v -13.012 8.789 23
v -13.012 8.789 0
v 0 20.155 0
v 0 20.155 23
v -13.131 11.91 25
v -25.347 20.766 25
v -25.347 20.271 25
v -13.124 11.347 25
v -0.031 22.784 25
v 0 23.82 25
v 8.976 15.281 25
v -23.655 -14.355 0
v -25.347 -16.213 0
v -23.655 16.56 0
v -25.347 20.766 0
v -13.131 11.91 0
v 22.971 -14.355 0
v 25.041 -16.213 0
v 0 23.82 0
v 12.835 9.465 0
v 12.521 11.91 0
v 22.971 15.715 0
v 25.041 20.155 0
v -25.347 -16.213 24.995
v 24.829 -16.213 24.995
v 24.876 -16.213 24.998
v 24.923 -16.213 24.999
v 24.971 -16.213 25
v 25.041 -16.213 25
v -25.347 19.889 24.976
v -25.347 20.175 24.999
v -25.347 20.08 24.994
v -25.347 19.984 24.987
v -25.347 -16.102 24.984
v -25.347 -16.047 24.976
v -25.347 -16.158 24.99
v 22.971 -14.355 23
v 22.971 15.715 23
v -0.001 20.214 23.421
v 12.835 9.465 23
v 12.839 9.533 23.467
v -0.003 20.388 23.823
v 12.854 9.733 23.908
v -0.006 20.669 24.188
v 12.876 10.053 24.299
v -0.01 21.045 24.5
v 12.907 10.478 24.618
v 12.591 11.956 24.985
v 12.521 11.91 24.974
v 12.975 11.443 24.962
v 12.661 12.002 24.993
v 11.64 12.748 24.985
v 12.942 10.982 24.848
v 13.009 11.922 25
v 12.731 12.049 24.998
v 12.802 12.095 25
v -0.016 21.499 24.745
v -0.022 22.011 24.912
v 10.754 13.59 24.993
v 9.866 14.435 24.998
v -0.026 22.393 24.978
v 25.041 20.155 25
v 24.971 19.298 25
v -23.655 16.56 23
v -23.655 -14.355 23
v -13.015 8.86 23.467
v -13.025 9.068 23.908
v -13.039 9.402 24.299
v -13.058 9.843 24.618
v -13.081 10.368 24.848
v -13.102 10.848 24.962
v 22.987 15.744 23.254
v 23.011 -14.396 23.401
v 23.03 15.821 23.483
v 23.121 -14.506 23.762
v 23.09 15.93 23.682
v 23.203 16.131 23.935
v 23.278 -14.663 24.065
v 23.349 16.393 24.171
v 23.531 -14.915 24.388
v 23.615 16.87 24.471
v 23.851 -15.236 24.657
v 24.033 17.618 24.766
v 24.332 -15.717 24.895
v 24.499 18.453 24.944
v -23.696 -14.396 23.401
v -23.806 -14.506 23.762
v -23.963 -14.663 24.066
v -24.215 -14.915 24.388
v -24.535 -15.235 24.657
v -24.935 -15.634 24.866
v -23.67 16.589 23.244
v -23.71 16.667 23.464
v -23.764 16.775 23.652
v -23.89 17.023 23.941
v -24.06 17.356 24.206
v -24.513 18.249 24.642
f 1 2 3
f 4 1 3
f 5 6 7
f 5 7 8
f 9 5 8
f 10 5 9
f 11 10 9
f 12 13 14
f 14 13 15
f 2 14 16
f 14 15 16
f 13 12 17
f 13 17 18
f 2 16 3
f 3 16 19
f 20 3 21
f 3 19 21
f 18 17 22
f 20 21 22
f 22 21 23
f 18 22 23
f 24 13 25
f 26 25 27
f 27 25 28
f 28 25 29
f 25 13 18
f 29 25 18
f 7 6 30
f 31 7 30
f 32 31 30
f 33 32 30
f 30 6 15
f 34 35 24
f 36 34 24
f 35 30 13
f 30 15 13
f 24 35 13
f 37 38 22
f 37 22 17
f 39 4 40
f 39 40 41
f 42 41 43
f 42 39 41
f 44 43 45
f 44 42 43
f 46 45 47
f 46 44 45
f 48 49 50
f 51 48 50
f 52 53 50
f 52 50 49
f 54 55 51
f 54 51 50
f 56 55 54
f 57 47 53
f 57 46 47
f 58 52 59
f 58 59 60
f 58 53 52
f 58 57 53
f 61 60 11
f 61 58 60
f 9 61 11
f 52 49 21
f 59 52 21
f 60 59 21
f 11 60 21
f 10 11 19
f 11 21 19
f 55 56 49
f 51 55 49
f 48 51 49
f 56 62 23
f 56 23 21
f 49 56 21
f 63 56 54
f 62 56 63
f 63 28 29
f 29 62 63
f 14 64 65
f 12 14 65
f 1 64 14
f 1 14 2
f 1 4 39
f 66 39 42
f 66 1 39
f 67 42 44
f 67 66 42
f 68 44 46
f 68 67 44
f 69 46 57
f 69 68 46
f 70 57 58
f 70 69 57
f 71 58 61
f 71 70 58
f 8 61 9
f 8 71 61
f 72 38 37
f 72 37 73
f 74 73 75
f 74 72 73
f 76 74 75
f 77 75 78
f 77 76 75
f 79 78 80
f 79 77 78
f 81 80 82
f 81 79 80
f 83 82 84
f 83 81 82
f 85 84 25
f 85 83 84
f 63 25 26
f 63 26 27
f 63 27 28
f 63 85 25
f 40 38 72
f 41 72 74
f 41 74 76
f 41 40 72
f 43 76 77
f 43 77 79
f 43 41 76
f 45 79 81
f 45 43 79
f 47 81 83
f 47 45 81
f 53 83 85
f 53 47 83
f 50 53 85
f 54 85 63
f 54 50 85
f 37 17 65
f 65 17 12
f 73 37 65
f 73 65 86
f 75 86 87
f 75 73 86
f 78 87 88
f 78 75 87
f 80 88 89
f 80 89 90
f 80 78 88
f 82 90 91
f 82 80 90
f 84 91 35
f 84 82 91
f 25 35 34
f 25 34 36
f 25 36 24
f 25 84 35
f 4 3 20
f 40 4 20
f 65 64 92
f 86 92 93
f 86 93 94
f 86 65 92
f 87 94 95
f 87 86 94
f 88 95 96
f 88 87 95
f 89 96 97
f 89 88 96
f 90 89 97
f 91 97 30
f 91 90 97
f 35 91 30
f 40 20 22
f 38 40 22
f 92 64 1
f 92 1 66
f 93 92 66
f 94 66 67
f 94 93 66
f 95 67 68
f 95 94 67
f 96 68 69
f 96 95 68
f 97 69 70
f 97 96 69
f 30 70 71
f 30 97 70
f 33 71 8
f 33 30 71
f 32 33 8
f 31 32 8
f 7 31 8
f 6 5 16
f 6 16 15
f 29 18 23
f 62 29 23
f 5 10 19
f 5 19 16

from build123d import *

# Parameters (mm, degrees)
F2_DEPTH     = 25
F3_T1_DEPTH  = 46.6258954257
F3_T6_DEPTH  = 35.914994888
F3_T11_DEPTH = 23.17796644
F3_T16_DEPTH = 27.2775423945
F3_T21_DEPTH = 26.7037330094
F3_T26_DEPTH = 21.9083744996
F3_T31_DEPTH = 35.0703225657
F3_T37_DEPTH = 51.6258954257
F3_T43_DEPTH = 40.914994888
F3_T52_DEPTH = 23.17796644
F3_T57_DEPTH = 35.914994888
F3_T66_DEPTH = 26.7037330094
F3_T71_DEPTH = 27.2775423945
F3_T79_DEPTH = 35.0703225657
F3_T84_DEPTH = 21.9083744996
F3_T92_DEPTH = 51.6258954257
F3_T98_DEPTH = 40.0703225657


# Not quite as in the source:
# - a fillet or chamfer that OpenCascade refuses, or shapes differently, is made with other operations: its cross-section is extruded or revolved along the edge and cut away or added


with BuildPart() as f2:
    # F0 (on Top) → F2 (new body)
    with BuildSketch(Plane.XY):
        Polygon((-25.346679613, 20.7659546286), (-25.346679613, 0), (-25.346679613, -16.2133686244), (25.0412952155, -16.2133686244), (25.0412952155, 0), (25.0412952155, 20.1551914215), (12.5206476077, 11.909885332), (0, 23.819770664), (-13.1314117461, 11.909885332), align=None)
        Polygon((-23.6552227288, -14.3550904468), (-23.6552227288, 16.5599044412), (-13.0123551935, 8.7889218703), (0, 20.1551914215), (12.8346113488, 9.4646606594), (22.9706726968, 15.715232119), (22.9706726968, -14.3550904468), align=None, mode=Mode.SUBTRACT)
    extrude(amount=F2_DEPTH)

    # F3: fillet of radius 2 on 7 edges, made by hand

    # F3_s2 → F3_t1 (cut)
    with BuildSketch(Plane.YZ.offset(-23.6552227288)):
        with BuildLine():
            ThreePointArc((-14.3550904468, 23), (-14.9408768844, 24.4142135624), (-16.3550904468, 25))
            Line((-16.3550904468, 25), (-14.3550904468, 25))
            Line((-14.3550904468, 25), (-14.3550904468, 23))
        make_face()
    extrude(amount=F3_T1_DEPTH, mode=Mode.SUBTRACT)


with BuildPart() as f3_tool4:
    # F3_s5 → F3_t6 (new body)
    with BuildSketch(Plane.XZ.offset(14.3550904468)):
        with BuildLine():
            ThreePointArc((-23.6552227288, 23), (-24.2410091665, 24.4142135624), (-25.6552227288, 25))
            Line((-25.6552227288, 25), (-23.6552227288, 25))
            Line((-23.6552227288, 25), (-23.6552227288, 23))
        make_face()
    extrude(amount=-F3_T6_DEPTH)

    split(bisect_by=Plane(origin=(-0.3391697192, -0.4645150547, 0), x_dir=(0, 0, 1), z_dir=(-0.5896951253, -0.8076259402, 0)), keep=Keep.TOP)


with BuildPart() as f2_1:
    add(f2.part)

    # F3_t3: cut F3_tool4
    add(f3_tool4.part, mode=Mode.SUBTRACT)


with BuildPart() as f3_tool9:
    # F3_s10 → F3_t11 (new body)
    with BuildSketch(Plane(origin=(-27.3541827104, 19.9728951224, 0), x_dir=(0, 0, 1), z_dir=(0.8076259402, -0.5896951253, 0))):
        with BuildLine():
            ThreePointArc((23, 0.5751611378), (24.4142135624, -0.0106252998), (25, -1.4248388622))
            Line((25, -1.4248388622), (25, 0.5751611378))
            Line((25, 0.5751611378), (23, 0.5751611378))
        make_face()
    extrude(amount=F3_T11_DEPTH)

    split(bisect_by=Plane.YZ.offset(-23.6552227288), keep=Keep.TOP)


with BuildPart() as f2_2:
    add(f2_1.part)

    # F3_t8: cut F3_tool9
    add(f3_tool9.part, mode=Mode.SUBTRACT)


with BuildPart() as f3_tool14:
    # F3_s15 → F3_t16 (new body)
    with BuildSketch(Plane(origin=(-6.7919181581, -5.9327286573, 0), x_dir=(0, 0, 1), z_dir=(0.7531369275, 0.6578637917, 0))):
        with BuildLine():
            ThreePointArc((23, -15.1796189401), (24.4142135624, -15.7654053777), (25, -17.1796189401))
            Line((25, -17.1796189401), (25, -15.1796189401))
            Line((25, -15.1796189401), (23, -15.1796189401))
        make_face()
    extrude(amount=F3_T16_DEPTH)

    split(bisect_by=Plane(origin=(9.9115559644, 11.8994062592, 0), x_dir=(0, 0, 1), z_dir=(-0.6400084793, -0.7683678458, 0)), keep=Keep.TOP)


with BuildPart() as f2_3:
    add(f2_2.part)

    # F3_t13: cut F3_tool14
    add(f3_tool14.part, mode=Mode.SUBTRACT)


with BuildPart() as f3_tool19:
    # F3_s20 → F3_t21 (new body)
    with BuildSketch(Plane(origin=(-13.7533951932, 11.4558275588, 0), x_dir=(0, 0, 1), z_dir=(0.7683678458, -0.6400084793, 0))):
        with BuildLine():
            ThreePointArc((23, -15.4866010137), (24.4142135624, -16.0723874513), (25, -17.4866010137))
            Line((25, -17.4866010137), (25, -15.4866010137))
            Line((25, -15.4866010137), (23, -15.4866010137))
        make_face()
    extrude(amount=F3_T21_DEPTH)

    split(bisect_by=Plane(origin=(-9.9861216728, 11.432331569, 0), x_dir=(0, 0, 1), z_dir=(0.6578637917, -0.7531369275, 0)), keep=Keep.TOP)


with BuildPart() as f2_4:
    add(f2_3.part)

    # F3_t18: cut F3_tool19
    add(f3_tool19.part, mode=Mode.SUBTRACT)


with BuildPart() as f3_tool24:
    # F3_s25 → F3_t26 (new body)
    with BuildSketch(Plane(origin=(9.271243063, 5.7172668253, 0), x_dir=(0, 0, 1), z_dir=(0.8511708587, 0.5248887209, 0))):
        with BuildLine():
            ThreePointArc((23, -1.3193006058), (24.4142135624, -1.9050870434), (25, -3.3193006058))
            Line((25, -3.3193006058), (25, -1.3193006058))
            Line((25, -1.3193006058), (23, -1.3193006058))
        make_face()
    extrude(amount=F3_T26_DEPTH)

    split(bisect_by=Plane.YZ.offset(22.9706726968), keep=Keep.BOTTOM)


with BuildPart() as f2_5:
    add(f2_4.part)

    # F3_t23: cut F3_tool24
    add(f3_tool24.part, mode=Mode.SUBTRACT)


with BuildPart() as f3_tool29:
    # F3_s30 → F3_t31 (new body)
    with BuildSketch(Plane.XZ.offset(-20.715232119)):
        with BuildLine():
            ThreePointArc((22.9706726968, 23), (23.5564591345, 24.4142135624), (24.9706726968, 25))
            Line((24.9706726968, 25), (22.9706726968, 25))
            Line((22.9706726968, 25), (22.9706726968, 23))
        make_face()
    extrude(amount=F3_T31_DEPTH)

    split(bisect_by=Plane(origin=(-0.6924860075, 1.1229502295, 0), x_dir=(0, 0, 1), z_dir=(0.5248887209, -0.8511708587, 0)), keep=Keep.TOP)


with BuildPart() as f2_6:
    add(f2_5.part)

    # F3_t28: cut F3_tool29
    add(f3_tool29.part, mode=Mode.SUBTRACT)


with BuildPart() as f3_tool35:
    # F3_s36 → F3_t37 (new body)
    with BuildSketch(Plane.YZ.offset(22.9706726968)):
        with BuildLine():
            ThreePointArc((-14.3550904468, 23), (-14.9408768844, 24.4142135624), (-16.3550904468, 25))
            Line((-16.3550904468, 25), (-14.3550904468, 25))
            Line((-14.3550904468, 25), (-14.3550904468, 23))
        make_face()
    extrude(amount=-F3_T37_DEPTH)

    split(bisect_by=Plane.YZ.offset(-25.346679613), keep=Keep.TOP)

    split(bisect_by=Plane.YZ.offset(-23.6552227288), keep=Keep.BOTTOM)

    split(bisect_by=Plane.XZ.offset(16.2133686244), keep=Keep.BOTTOM)


with BuildPart() as f3_tool41:
    # F3_s42 → F3_t43 (new body)
    with BuildSketch(Plane.XZ.offset(19.3550904468)):
        with BuildLine():
            ThreePointArc((-23.6552227288, 23), (-24.2410091665, 24.4142135624), (-25.6552227288, 25))
            Line((-25.6552227288, 25), (-23.6552227288, 25))
            Line((-23.6552227288, 25), (-23.6552227288, 23))
        make_face()
    extrude(amount=-F3_T43_DEPTH)

    split(bisect_by=Plane.YZ.offset(-25.346679613), keep=Keep.TOP)

    split(bisect_by=Plane.XZ.offset(14.3550904468), keep=Keep.TOP)

    split(bisect_by=Plane.XZ.offset(16.2133686244), keep=Keep.BOTTOM)


with BuildPart() as f3_tool35_1:
    add(f3_tool35.part)

    # F3_t47: intersect F3_tool41
    add(f3_tool41.part, mode=Mode.INTERSECT)


with BuildPart() as f2_7:
    add(f2_6.part)

    # F3_t33: cut F3_tool35
    add(f3_tool35_1.part, mode=Mode.SUBTRACT)


with BuildPart() as f3_tool50:
    # F3_s51 → F3_t52 (new body)
    with BuildSketch(Plane(origin=(-27.3541827104, 19.9728951224, 0), x_dir=(0, 0, 1), z_dir=(0.8076259402, -0.5896951253, 0))):
        with BuildLine():
            ThreePointArc((23, 0.5751611378), (24.4142135624, -0.0106252998), (25, -1.4248388622))
            Line((25, -1.4248388622), (25, 0.5751611378))
            Line((25, 0.5751611378), (23, 0.5751611378))
        make_face()
    extrude(amount=F3_T52_DEPTH)

    split(bisect_by=Plane.YZ.offset(-25.346679613), keep=Keep.TOP)

    split(bisect_by=Plane.YZ.offset(-23.6552227288), keep=Keep.BOTTOM)


with BuildPart() as f3_tool55:
    # F3_s56 → F3_t57 (new body)
    with BuildSketch(Plane.XZ.offset(14.3550904468)):
        with BuildLine():
            ThreePointArc((-23.6552227288, 23), (-24.2410091665, 24.4142135624), (-25.6552227288, 25))
            Line((-25.6552227288, 25), (-23.6552227288, 25))
            Line((-23.6552227288, 25), (-23.6552227288, 23))
        make_face()
    extrude(amount=-F3_T57_DEPTH)

    split(bisect_by=Plane.YZ.offset(-25.346679613), keep=Keep.TOP)

    split(bisect_by=Plane(origin=(-0.3391697192, -0.4645150547, 0), x_dir=(0, 0, 1), z_dir=(0.5896951253, 0.8076259402, 0)), keep=Keep.TOP)

    split(bisect_by=Plane(origin=(1.1355795164, 1.5663165579, 0), x_dir=(0, 0, 1), z_dir=(-0.5869675755, -0.8096104405, 0)), keep=Keep.TOP)


with BuildPart() as f3_tool50_1:
    add(f3_tool50.part)

    # F3_t61: intersect F3_tool55
    add(f3_tool55.part, mode=Mode.INTERSECT)


with BuildPart() as f2_8:
    add(f2_7.part)

    # F3_t48: cut F3_tool50
    add(f3_tool50_1.part, mode=Mode.SUBTRACT)


with BuildPart() as f3_tool64:
    # F3_s65 → F3_t66 (new body)
    with BuildSketch(Plane(origin=(-13.7533951932, 11.4558275588, 0), x_dir=(0, 0, 1), z_dir=(0.7683678458, -0.6400084793, 0))):
        with BuildLine():
            ThreePointArc((23, -15.4866010137), (24.4142135624, -16.0723874513), (25, -17.4866010137))
            Line((25, -17.4866010137), (25, -15.4866010137))
            Line((25, -15.4866010137), (23, -15.4866010137))
        make_face()
    extrude(amount=F3_T66_DEPTH)

    split(bisect_by=Plane(origin=(-9.9861216728, 11.432331569, 0), x_dir=(0, 0, 1), z_dir=(-0.6578637917, 0.7531369275, 0)), keep=Keep.TOP)

    split(bisect_by=Plane(origin=(-11.8533399075, 13.0690667923, 0), x_dir=(0, 0, 1), z_dir=(0.6718149465, -0.7407190274, 0)), keep=Keep.TOP)


with BuildPart() as f3_tool69:
    # F3_s70 → F3_t71 (new body)
    with BuildSketch(Plane(origin=(-6.7919181581, -5.9327286573, 0), x_dir=(0, 0, 1), z_dir=(0.7531369275, 0.6578637917, 0))):
        with BuildLine():
            ThreePointArc((23, -15.1796189401), (24.4142135624, -15.7654053777), (25, -17.1796189401))
            Line((25, -17.1796189401), (25, -15.1796189401))
            Line((25, -15.1796189401), (23, -15.1796189401))
        make_face()
    extrude(amount=F3_T71_DEPTH)

    split(bisect_by=Plane(origin=(9.9115559644, 11.8994062592, 0), x_dir=(0, 0, 1), z_dir=(0.6400084793, 0.7683678458, 0)), keep=Keep.TOP)

    split(bisect_by=Plane(origin=(11.8950073251, 12.5050066275, 0), x_dir=(0, 0, 1), z_dir=(-0.6892137971, -0.7245580322, 0)), keep=Keep.TOP)


with BuildPart() as f3_tool64_1:
    add(f3_tool64.part)

    # F3_t74: intersect F3_tool69
    add(f3_tool69.part, mode=Mode.INTERSECT)


with BuildPart() as f2_9:
    add(f2_8.part)

    # F3_t62: cut F3_tool64
    add(f3_tool64_1.part, mode=Mode.SUBTRACT)


with BuildPart() as f3_tool77:
    # F3_s78 → F3_t79 (new body)
    with BuildSketch(Plane.XZ.offset(-20.715232119)):
        with BuildLine():
            ThreePointArc((22.9706726968, 23), (23.5564591345, 24.4142135624), (24.9706726968, 25))
            Line((24.9706726968, 25), (22.9706726968, 25))
            Line((22.9706726968, 25), (22.9706726968, 23))
        make_face()
    extrude(amount=F3_T79_DEPTH)

    split(bisect_by=Plane(origin=(-0.6924860075, 1.1229502295, 0), x_dir=(0, 0, 1), z_dir=(-0.5248887209, 0.8511708587, 0)), keep=Keep.TOP)

    split(bisect_by=Plane(origin=(-1.6832736623, 2.556081742, 0), x_dir=(0, 0, 1), z_dir=(0.5499906424, -0.8351708168, 0)), keep=Keep.TOP)


with BuildPart() as f3_tool82:
    # F3_s83 → F3_t84 (new body)
    with BuildSketch(Plane(origin=(9.271243063, 5.7172668253, 0), x_dir=(0, 0, 1), z_dir=(0.8511708587, 0.5248887209, 0))):
        with BuildLine():
            ThreePointArc((23, -1.3193006058), (24.4142135624, -1.9050870434), (25, -3.3193006058))
            Line((25, -3.3193006058), (25, -1.3193006058))
            Line((25, -1.3193006058), (23, -1.3193006058))
        make_face()
    extrude(amount=F3_T84_DEPTH)

    split(bisect_by=Plane.YZ.offset(22.9706726968), keep=Keep.TOP)

    split(bisect_by=Plane.YZ.offset(25.0412952155), keep=Keep.BOTTOM)


with BuildPart() as f3_tool77_1:
    add(f3_tool77.part)

    # F3_t87: intersect F3_tool82
    add(f3_tool82.part, mode=Mode.INTERSECT)


with BuildPart() as f2_10:
    add(f2_9.part)

    # F3_t75: cut F3_tool77
    add(f3_tool77_1.part, mode=Mode.SUBTRACT)


with BuildPart() as f3_tool90:
    # F3_s91 → F3_t92 (new body)
    with BuildSketch(Plane.YZ.offset(27.9706726968)):
        with BuildLine():
            ThreePointArc((-14.3550904468, 23), (-14.9408768844, 24.4142135624), (-16.3550904468, 25))
            Line((-16.3550904468, 25), (-14.3550904468, 25))
            Line((-14.3550904468, 25), (-14.3550904468, 23))
        make_face()
    extrude(amount=-F3_T92_DEPTH)

    split(bisect_by=Plane.YZ.offset(22.9706726968), keep=Keep.TOP)

    split(bisect_by=Plane.YZ.offset(25.0412952155), keep=Keep.BOTTOM)

    split(bisect_by=Plane.XZ.offset(16.2133686244), keep=Keep.BOTTOM)


with BuildPart() as f3_tool96:
    # F3_s97 → F3_t98 (new body)
    with BuildSketch(Plane.XZ.offset(-20.715232119)):
        with BuildLine():
            ThreePointArc((22.9706726968, 23), (23.5564591345, 24.4142135624), (24.9706726968, 25))
            Line((24.9706726968, 25), (22.9706726968, 25))
            Line((22.9706726968, 25), (22.9706726968, 23))
        make_face()
    extrude(amount=F3_T98_DEPTH)

    split(bisect_by=Plane.XZ.offset(14.3550904468), keep=Keep.TOP)

    split(bisect_by=Plane.XZ.offset(16.2133686244), keep=Keep.BOTTOM)


with BuildPart() as f3_tool90_1:
    add(f3_tool90.part)

    # F3_t101: intersect F3_tool96
    add(f3_tool96.part, mode=Mode.INTERSECT)


with BuildPart() as f2_11:
    add(f2_10.part)

    # F3_t88: cut F3_tool90
    add(f3_tool90_1.part, mode=Mode.SUBTRACT)


solid = f2_11.part
